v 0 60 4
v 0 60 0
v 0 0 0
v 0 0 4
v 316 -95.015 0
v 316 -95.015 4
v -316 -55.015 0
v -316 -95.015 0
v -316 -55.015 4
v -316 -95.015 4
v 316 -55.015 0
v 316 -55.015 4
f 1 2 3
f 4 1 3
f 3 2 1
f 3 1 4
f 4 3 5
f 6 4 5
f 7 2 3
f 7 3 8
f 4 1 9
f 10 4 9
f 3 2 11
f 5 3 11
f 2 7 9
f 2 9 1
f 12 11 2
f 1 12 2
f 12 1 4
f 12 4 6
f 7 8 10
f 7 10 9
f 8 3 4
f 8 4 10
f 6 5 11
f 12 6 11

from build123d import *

# Parameters (mm, degrees)
BOSS_EXTRUDE1_DEPTH = 4


with BuildPart() as part:
    # Sketch1 → Boss-Extrude1 (new body)
    with BuildSketch(Plane.XY):
        Polygon((0, 60), (0, 0), (316, -95.014594028), (316, -55.014594028), align=None)
    extrude(amount=BOSS_EXTRUDE1_DEPTH)


with BuildPart() as body_2:
    # Mirror1: mirrored copy
    add(part.part.mirror(Plane(origin=(0, 0, 0), x_dir=(0, 0, 1), z_dir=(1, 0, 0))))


solid = Compound([part.part, body_2.part])
